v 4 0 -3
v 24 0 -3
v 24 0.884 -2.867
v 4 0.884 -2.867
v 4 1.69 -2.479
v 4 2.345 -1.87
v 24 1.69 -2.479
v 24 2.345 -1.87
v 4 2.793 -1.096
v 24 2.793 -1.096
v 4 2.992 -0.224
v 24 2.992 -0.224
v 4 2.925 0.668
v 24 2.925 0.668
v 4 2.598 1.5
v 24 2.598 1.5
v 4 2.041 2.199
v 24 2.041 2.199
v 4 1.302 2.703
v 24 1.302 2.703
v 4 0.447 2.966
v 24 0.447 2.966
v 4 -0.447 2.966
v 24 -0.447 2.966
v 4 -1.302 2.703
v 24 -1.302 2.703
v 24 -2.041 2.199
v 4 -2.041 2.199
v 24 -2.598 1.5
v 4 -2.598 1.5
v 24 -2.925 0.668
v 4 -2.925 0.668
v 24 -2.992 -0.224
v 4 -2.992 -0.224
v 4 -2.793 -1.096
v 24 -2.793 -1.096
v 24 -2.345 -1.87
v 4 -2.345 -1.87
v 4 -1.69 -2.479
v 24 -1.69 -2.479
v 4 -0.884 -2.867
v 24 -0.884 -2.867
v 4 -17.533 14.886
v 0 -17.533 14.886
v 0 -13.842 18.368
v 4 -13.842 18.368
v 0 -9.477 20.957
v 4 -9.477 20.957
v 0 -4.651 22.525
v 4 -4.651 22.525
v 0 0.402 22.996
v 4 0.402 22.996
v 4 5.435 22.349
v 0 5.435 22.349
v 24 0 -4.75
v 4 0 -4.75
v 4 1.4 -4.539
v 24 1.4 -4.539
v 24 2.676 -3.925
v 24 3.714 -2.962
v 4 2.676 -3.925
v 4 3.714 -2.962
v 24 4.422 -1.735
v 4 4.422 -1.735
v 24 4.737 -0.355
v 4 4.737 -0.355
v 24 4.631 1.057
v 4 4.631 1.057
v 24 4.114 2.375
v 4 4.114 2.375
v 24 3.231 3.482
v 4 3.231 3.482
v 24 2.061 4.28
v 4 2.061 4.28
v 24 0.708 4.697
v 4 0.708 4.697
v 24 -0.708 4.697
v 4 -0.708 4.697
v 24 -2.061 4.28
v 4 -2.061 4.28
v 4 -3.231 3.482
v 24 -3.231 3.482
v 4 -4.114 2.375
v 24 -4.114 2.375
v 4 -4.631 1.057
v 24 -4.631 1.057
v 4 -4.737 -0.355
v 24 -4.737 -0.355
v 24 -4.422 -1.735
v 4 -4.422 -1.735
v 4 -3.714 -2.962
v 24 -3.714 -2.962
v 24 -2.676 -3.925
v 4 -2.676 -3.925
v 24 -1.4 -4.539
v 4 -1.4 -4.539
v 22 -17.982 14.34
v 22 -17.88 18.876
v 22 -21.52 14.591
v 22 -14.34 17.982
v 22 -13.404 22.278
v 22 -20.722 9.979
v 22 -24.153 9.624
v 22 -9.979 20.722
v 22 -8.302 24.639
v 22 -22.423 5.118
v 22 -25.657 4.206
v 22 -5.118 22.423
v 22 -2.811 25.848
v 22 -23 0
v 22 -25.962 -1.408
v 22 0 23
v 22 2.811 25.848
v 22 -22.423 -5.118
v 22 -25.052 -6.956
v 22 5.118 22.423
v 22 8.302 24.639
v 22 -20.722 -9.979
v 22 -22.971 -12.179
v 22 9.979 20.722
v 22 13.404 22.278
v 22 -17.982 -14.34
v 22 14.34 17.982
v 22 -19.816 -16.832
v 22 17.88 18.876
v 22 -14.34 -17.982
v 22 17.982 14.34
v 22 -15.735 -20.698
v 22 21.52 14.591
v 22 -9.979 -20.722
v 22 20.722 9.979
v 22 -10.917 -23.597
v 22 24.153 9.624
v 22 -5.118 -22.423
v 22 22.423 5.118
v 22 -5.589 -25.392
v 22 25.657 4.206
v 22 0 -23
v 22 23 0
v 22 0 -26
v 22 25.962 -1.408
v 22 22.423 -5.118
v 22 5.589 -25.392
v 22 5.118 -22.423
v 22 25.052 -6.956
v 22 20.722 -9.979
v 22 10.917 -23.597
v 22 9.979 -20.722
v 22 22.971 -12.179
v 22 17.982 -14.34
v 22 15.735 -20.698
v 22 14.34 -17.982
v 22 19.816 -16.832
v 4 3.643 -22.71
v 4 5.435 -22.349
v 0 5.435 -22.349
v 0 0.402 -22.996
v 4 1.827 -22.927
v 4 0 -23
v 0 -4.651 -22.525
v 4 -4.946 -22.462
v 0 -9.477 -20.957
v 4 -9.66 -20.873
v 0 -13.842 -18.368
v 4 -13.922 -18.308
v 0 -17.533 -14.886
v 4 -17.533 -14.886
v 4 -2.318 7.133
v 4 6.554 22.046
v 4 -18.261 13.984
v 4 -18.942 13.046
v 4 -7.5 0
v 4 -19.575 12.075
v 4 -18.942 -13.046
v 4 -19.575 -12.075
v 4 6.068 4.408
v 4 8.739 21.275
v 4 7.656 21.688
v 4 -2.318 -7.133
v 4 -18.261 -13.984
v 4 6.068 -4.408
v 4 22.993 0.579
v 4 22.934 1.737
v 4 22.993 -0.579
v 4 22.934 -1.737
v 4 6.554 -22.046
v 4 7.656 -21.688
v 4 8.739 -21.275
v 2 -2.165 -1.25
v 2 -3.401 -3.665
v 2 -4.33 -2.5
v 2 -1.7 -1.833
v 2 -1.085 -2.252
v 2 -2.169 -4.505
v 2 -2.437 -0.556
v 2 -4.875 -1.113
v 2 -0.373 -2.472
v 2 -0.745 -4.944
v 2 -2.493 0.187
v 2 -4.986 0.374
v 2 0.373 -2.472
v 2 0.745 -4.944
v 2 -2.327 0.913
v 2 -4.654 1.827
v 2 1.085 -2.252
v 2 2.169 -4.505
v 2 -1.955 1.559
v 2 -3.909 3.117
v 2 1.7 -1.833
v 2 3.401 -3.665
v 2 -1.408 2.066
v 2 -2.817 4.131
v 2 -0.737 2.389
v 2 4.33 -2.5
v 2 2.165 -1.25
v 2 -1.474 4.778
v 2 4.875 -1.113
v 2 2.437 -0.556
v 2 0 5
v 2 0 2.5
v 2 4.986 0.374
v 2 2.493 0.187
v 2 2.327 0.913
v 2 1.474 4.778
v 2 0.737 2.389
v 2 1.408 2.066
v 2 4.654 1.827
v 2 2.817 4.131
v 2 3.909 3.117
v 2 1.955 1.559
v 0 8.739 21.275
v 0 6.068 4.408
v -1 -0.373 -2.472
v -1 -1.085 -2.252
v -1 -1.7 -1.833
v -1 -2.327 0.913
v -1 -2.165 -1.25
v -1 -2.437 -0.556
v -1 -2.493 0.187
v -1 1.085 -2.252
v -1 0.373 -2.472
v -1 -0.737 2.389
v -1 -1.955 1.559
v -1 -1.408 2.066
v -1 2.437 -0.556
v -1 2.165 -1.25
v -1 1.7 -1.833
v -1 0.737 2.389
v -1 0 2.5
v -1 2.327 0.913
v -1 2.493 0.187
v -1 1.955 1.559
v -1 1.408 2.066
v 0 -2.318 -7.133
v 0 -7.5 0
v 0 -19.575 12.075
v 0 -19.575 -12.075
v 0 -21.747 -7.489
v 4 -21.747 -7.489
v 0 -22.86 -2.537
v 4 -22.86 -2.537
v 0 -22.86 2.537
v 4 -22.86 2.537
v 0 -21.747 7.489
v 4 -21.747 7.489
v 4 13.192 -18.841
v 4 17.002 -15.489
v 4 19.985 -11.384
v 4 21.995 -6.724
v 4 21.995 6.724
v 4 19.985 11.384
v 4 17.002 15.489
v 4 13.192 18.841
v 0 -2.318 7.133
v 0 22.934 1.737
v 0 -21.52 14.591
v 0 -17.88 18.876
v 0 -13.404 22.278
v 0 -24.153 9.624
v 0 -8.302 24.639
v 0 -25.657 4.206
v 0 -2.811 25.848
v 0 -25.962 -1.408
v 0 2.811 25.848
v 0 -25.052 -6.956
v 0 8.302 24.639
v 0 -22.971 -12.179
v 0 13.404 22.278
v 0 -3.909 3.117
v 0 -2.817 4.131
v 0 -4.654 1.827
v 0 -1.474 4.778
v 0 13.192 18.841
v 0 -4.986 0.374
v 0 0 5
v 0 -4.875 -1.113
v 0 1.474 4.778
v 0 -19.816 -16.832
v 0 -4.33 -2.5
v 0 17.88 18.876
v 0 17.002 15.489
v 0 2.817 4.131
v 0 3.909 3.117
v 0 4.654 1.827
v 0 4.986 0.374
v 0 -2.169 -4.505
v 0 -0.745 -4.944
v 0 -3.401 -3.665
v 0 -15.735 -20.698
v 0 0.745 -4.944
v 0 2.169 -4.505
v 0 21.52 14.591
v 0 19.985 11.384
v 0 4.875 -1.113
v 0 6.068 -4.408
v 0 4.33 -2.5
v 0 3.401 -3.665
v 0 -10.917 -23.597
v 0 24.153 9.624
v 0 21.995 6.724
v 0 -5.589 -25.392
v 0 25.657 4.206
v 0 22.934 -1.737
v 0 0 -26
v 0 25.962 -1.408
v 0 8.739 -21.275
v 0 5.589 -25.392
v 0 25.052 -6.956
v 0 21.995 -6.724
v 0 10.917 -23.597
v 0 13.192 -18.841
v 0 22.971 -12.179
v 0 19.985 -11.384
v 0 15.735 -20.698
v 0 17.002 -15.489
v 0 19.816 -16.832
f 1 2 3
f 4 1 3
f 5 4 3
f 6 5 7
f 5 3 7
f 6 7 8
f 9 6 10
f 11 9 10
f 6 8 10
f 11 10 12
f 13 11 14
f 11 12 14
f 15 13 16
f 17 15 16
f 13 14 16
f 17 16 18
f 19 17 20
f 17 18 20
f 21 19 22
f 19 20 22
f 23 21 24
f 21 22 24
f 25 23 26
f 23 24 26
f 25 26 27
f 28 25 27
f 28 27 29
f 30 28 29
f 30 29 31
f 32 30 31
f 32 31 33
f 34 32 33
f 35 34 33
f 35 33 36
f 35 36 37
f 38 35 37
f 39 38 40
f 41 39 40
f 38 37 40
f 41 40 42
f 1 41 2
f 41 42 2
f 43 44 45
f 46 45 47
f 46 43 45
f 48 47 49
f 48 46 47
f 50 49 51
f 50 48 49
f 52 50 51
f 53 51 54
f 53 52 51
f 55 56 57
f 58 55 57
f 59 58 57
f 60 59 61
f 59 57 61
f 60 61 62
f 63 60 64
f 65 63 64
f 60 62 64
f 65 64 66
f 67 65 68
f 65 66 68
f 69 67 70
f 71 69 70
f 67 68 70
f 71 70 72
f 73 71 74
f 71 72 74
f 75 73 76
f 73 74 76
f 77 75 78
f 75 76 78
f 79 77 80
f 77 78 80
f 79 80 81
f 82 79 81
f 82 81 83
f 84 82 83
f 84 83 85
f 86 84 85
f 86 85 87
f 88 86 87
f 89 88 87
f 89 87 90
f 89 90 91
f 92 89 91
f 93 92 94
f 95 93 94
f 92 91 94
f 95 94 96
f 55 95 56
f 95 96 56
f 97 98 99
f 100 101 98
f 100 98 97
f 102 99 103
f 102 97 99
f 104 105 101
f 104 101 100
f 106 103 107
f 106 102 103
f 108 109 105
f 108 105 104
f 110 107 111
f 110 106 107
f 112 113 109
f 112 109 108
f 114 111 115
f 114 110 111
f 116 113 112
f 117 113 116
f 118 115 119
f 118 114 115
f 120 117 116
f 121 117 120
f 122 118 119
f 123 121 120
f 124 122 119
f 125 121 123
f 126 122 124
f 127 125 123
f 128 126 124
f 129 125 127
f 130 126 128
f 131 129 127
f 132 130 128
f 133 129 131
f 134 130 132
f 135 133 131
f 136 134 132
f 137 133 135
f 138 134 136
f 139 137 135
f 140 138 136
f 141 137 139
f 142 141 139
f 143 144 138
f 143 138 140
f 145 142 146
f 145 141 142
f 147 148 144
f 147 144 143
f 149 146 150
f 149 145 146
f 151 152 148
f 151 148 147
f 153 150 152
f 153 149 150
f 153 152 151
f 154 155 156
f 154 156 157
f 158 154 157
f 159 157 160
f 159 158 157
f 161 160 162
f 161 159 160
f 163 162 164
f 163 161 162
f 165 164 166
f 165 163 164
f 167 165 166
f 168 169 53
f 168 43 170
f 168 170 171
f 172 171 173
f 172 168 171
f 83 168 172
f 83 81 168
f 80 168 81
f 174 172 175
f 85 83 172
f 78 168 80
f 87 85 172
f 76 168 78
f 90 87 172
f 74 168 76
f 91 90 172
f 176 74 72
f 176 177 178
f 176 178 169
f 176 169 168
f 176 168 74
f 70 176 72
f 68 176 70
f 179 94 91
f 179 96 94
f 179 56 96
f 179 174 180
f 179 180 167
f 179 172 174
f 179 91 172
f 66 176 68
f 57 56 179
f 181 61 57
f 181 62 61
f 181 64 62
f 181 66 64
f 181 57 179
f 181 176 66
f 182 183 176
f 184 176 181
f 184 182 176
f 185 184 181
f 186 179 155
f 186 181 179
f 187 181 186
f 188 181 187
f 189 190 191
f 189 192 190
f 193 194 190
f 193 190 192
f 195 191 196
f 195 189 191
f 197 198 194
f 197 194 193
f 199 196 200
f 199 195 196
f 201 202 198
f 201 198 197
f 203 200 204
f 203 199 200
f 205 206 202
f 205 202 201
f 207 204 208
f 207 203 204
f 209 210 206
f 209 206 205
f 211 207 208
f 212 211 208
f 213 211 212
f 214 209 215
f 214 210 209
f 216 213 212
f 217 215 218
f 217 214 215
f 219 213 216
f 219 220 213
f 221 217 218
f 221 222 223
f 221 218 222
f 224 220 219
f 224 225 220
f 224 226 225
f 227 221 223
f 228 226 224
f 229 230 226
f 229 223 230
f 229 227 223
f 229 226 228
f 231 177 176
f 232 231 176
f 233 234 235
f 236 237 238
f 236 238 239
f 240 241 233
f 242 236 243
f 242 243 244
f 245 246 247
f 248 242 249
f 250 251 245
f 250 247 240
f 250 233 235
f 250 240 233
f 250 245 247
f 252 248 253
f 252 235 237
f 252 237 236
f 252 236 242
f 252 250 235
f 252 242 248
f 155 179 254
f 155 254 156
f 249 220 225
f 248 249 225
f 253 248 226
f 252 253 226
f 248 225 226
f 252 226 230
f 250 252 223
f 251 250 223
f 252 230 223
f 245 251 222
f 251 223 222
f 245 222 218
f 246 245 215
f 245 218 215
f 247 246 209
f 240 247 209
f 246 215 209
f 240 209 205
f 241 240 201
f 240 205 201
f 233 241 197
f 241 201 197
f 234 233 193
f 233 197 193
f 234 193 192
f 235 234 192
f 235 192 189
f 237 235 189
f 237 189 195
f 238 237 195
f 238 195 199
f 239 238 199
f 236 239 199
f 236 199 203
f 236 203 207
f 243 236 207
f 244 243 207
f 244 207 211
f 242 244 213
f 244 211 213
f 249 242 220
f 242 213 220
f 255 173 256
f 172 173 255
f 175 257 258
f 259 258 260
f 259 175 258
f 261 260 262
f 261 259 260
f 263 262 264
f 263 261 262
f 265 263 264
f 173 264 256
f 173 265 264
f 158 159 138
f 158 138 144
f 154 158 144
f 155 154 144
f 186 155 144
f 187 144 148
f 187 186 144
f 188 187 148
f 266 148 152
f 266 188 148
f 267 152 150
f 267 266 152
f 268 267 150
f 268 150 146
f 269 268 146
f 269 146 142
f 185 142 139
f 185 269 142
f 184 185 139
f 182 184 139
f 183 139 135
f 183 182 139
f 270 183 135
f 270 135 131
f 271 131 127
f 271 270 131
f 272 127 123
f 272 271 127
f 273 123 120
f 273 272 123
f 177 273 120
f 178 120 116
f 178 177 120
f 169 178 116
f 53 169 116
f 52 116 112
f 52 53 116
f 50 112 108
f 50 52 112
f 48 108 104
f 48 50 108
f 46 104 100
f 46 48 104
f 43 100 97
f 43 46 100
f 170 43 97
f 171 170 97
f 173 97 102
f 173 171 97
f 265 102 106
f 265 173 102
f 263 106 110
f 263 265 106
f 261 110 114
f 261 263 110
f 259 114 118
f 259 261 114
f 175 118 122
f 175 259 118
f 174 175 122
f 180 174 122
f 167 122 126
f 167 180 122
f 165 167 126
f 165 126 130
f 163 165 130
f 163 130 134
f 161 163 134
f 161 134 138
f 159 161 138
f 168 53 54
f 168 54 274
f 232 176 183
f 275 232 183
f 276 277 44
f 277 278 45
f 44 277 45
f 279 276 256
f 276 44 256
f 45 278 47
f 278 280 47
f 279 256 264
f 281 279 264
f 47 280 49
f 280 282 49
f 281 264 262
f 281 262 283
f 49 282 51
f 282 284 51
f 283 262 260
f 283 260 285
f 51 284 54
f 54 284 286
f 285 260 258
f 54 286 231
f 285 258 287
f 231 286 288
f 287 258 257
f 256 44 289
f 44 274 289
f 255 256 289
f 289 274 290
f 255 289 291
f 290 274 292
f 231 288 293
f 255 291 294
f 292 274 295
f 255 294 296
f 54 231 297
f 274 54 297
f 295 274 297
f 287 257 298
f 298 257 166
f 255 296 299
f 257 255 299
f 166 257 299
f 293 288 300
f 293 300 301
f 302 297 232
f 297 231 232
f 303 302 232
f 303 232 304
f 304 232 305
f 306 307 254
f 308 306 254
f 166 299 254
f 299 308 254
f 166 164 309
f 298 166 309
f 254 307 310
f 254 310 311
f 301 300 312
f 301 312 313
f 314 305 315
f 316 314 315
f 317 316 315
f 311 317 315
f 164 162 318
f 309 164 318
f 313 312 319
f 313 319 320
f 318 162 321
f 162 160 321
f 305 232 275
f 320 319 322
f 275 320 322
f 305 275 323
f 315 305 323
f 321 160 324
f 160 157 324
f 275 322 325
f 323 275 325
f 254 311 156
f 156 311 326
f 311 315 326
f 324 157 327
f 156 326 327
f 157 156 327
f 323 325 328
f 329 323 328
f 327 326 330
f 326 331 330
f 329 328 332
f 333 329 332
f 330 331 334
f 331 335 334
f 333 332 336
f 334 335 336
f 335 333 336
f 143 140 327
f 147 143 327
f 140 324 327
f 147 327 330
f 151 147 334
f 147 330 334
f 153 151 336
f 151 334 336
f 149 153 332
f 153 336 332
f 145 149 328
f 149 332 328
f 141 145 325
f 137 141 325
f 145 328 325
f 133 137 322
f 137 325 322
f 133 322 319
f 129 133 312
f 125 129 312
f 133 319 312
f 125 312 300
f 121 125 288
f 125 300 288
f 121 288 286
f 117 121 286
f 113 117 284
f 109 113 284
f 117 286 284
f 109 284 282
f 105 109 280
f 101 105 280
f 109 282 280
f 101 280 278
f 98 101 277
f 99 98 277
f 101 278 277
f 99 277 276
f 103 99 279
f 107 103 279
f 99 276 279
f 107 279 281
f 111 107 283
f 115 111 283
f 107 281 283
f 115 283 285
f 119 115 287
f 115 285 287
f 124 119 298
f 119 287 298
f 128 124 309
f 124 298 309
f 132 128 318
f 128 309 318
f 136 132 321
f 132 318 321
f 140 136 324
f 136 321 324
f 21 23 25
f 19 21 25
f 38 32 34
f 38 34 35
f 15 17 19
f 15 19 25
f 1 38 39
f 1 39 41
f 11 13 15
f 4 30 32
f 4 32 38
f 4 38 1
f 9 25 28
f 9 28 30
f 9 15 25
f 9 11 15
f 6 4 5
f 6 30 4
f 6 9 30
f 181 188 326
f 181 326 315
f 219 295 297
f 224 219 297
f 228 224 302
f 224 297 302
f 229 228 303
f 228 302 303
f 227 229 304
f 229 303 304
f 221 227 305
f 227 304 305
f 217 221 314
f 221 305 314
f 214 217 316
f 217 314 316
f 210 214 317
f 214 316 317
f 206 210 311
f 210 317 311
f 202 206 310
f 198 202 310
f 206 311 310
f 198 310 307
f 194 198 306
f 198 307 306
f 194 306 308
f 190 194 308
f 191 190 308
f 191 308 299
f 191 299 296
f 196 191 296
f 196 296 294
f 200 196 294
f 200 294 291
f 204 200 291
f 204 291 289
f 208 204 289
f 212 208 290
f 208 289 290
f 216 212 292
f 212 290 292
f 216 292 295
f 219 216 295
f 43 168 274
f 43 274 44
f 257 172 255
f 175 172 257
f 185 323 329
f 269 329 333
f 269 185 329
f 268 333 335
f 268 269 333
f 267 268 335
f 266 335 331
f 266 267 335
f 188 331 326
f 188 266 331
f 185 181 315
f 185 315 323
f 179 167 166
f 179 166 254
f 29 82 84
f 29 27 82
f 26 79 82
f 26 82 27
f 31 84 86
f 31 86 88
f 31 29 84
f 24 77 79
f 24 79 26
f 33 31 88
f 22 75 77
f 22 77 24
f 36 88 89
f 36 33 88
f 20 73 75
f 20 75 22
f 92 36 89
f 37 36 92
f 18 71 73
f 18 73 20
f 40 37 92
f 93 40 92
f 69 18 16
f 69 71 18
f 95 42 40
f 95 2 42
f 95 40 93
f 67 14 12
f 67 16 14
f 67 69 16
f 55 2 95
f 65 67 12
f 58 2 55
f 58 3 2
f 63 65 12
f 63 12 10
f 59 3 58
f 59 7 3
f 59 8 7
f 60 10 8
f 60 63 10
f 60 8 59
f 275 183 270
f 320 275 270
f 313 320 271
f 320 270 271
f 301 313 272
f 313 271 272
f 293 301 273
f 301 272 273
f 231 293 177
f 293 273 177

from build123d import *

# Parameters (mm, degrees)
SKETCH_1_R          = 26
EXTRUDE_1_DEPTH     = 4
SKETCH_2_R          = 4.75
EXTRUDE_2_DEPTH     = 20
SKETCH_3_R          = 3
CUT_EXTRUDE_1_DEPTH = 20
SKETCH_4_R          = 26
SKETCH_4_R_2        = 23
EXTRUDE_3_DEPTH     = 18
CUT_EXTRUDE_2_DEPTH = 5
SKETCH_6_R          = 5
CUT_EXTRUDE_3_DEPTH = 2
SKETCH_7_R          = 2.5
EXTRUDE_4_DEPTH     = 3


with BuildPart() as part:
    # 草图1 → 凸台-拉伸1 (new body)
    with BuildSketch(Plane(origin=(0, 0, 0), x_dir=(0, 0, -1), z_dir=(1, 0, 0))):
        Circle(SKETCH_1_R)
    extrude(amount=EXTRUDE_1_DEPTH)

    # 草图2 → 凸台-拉伸2 (add)
    with BuildSketch(Plane(origin=(4, 0, 0), x_dir=(0, 0, -1), z_dir=(1, 0, 0))):
        Circle(SKETCH_2_R)
    extrude(amount=EXTRUDE_2_DEPTH)

    # 草图3 → 切除-拉伸1 (cut)
    with BuildSketch(Plane(origin=(24, 0, 0), x_dir=(0, 0, -1), z_dir=(1, 0, 0))):
        Circle(SKETCH_3_R)
    extrude(amount=-CUT_EXTRUDE_1_DEPTH, mode=Mode.SUBTRACT)

    # 草图4 → 凸台-拉伸3 (add)
    with BuildSketch(Plane(origin=(4, 0, 0), x_dir=(0, 0, -1), z_dir=(1, 0, 0))):
        Circle(SKETCH_4_R)
        Circle(SKETCH_4_R_2, mode=Mode.SUBTRACT)
    extrude(amount=EXTRUDE_3_DEPTH)

    # 草图5 → 切除-拉伸2 (cut, through all)
    with BuildSketch(Plane(origin=(4, 0, 0), x_dir=(0, 0, -1), z_dir=(1, 0, 0))):
        with BuildLine():
            Line((-21.275079931, 8.739048799), (-4.408389392, 6.067627458))
            Line((-4.408389392, 6.067627458), (-1.736968051, 22.934317997))
            ThreePointArc((-1.736968051, 22.934317997), (-13.519060803, 18.607390871), (-21.275079931, 8.739048799))
        make_face()
        with BuildLine():
            Line((21.275079931, 8.739048799), (4.408389392, 6.067627458))
            Line((4.408389392, 6.067627458), (1.736968051, 22.934317997))
            ThreePointArc((1.736968051, 22.934317997), (13.519060803, 18.607390871), (21.275079931, 8.739048799))
        make_face()
        with BuildLine():
            Line((14.885690562, -17.53328881), (7.132923872, -2.317627458))
            Line((7.132923872, -2.317627458), (22.348585224, 5.435139232))
            ThreePointArc((22.348585224, 5.435139232), (21.874299875, -7.107390871), (14.885690562, -17.53328881))
        make_face()
        with BuildLine():
            Line((-12.075217218, -19.575217218), (0, -7.5))
            Line((0, -7.5), (12.075217218, -19.575217218))
            ThreePointArc((12.075217218, -19.575217218), (0, -23), (-12.075217218, -19.575217218))
        make_face()
        with BuildLine():
            Line((-22.348585224, 5.435139232), (-7.132923872, -2.317627458))
            Line((-7.132923872, -2.317627458), (-14.885690562, -17.53328881))
            ThreePointArc((-14.885690562, -17.53328881), (-21.874299875, -7.107390871), (-22.348585224, 5.435139232))
        make_face()
    extrude(amount=-CUT_EXTRUDE_2_DEPTH, mode=Mode.SUBTRACT)

    # 草图6 → 切除-拉伸3 (cut)
    with BuildSketch(Plane.ZY):
        Circle(SKETCH_6_R)
    extrude(amount=-CUT_EXTRUDE_3_DEPTH, mode=Mode.SUBTRACT)

    # 草图7 → 凸台-拉伸4 (add)
    with BuildSketch(Plane.ZY.offset(-2)):
        Circle(SKETCH_7_R)
    extrude(amount=EXTRUDE_4_DEPTH)


solid = part.part
